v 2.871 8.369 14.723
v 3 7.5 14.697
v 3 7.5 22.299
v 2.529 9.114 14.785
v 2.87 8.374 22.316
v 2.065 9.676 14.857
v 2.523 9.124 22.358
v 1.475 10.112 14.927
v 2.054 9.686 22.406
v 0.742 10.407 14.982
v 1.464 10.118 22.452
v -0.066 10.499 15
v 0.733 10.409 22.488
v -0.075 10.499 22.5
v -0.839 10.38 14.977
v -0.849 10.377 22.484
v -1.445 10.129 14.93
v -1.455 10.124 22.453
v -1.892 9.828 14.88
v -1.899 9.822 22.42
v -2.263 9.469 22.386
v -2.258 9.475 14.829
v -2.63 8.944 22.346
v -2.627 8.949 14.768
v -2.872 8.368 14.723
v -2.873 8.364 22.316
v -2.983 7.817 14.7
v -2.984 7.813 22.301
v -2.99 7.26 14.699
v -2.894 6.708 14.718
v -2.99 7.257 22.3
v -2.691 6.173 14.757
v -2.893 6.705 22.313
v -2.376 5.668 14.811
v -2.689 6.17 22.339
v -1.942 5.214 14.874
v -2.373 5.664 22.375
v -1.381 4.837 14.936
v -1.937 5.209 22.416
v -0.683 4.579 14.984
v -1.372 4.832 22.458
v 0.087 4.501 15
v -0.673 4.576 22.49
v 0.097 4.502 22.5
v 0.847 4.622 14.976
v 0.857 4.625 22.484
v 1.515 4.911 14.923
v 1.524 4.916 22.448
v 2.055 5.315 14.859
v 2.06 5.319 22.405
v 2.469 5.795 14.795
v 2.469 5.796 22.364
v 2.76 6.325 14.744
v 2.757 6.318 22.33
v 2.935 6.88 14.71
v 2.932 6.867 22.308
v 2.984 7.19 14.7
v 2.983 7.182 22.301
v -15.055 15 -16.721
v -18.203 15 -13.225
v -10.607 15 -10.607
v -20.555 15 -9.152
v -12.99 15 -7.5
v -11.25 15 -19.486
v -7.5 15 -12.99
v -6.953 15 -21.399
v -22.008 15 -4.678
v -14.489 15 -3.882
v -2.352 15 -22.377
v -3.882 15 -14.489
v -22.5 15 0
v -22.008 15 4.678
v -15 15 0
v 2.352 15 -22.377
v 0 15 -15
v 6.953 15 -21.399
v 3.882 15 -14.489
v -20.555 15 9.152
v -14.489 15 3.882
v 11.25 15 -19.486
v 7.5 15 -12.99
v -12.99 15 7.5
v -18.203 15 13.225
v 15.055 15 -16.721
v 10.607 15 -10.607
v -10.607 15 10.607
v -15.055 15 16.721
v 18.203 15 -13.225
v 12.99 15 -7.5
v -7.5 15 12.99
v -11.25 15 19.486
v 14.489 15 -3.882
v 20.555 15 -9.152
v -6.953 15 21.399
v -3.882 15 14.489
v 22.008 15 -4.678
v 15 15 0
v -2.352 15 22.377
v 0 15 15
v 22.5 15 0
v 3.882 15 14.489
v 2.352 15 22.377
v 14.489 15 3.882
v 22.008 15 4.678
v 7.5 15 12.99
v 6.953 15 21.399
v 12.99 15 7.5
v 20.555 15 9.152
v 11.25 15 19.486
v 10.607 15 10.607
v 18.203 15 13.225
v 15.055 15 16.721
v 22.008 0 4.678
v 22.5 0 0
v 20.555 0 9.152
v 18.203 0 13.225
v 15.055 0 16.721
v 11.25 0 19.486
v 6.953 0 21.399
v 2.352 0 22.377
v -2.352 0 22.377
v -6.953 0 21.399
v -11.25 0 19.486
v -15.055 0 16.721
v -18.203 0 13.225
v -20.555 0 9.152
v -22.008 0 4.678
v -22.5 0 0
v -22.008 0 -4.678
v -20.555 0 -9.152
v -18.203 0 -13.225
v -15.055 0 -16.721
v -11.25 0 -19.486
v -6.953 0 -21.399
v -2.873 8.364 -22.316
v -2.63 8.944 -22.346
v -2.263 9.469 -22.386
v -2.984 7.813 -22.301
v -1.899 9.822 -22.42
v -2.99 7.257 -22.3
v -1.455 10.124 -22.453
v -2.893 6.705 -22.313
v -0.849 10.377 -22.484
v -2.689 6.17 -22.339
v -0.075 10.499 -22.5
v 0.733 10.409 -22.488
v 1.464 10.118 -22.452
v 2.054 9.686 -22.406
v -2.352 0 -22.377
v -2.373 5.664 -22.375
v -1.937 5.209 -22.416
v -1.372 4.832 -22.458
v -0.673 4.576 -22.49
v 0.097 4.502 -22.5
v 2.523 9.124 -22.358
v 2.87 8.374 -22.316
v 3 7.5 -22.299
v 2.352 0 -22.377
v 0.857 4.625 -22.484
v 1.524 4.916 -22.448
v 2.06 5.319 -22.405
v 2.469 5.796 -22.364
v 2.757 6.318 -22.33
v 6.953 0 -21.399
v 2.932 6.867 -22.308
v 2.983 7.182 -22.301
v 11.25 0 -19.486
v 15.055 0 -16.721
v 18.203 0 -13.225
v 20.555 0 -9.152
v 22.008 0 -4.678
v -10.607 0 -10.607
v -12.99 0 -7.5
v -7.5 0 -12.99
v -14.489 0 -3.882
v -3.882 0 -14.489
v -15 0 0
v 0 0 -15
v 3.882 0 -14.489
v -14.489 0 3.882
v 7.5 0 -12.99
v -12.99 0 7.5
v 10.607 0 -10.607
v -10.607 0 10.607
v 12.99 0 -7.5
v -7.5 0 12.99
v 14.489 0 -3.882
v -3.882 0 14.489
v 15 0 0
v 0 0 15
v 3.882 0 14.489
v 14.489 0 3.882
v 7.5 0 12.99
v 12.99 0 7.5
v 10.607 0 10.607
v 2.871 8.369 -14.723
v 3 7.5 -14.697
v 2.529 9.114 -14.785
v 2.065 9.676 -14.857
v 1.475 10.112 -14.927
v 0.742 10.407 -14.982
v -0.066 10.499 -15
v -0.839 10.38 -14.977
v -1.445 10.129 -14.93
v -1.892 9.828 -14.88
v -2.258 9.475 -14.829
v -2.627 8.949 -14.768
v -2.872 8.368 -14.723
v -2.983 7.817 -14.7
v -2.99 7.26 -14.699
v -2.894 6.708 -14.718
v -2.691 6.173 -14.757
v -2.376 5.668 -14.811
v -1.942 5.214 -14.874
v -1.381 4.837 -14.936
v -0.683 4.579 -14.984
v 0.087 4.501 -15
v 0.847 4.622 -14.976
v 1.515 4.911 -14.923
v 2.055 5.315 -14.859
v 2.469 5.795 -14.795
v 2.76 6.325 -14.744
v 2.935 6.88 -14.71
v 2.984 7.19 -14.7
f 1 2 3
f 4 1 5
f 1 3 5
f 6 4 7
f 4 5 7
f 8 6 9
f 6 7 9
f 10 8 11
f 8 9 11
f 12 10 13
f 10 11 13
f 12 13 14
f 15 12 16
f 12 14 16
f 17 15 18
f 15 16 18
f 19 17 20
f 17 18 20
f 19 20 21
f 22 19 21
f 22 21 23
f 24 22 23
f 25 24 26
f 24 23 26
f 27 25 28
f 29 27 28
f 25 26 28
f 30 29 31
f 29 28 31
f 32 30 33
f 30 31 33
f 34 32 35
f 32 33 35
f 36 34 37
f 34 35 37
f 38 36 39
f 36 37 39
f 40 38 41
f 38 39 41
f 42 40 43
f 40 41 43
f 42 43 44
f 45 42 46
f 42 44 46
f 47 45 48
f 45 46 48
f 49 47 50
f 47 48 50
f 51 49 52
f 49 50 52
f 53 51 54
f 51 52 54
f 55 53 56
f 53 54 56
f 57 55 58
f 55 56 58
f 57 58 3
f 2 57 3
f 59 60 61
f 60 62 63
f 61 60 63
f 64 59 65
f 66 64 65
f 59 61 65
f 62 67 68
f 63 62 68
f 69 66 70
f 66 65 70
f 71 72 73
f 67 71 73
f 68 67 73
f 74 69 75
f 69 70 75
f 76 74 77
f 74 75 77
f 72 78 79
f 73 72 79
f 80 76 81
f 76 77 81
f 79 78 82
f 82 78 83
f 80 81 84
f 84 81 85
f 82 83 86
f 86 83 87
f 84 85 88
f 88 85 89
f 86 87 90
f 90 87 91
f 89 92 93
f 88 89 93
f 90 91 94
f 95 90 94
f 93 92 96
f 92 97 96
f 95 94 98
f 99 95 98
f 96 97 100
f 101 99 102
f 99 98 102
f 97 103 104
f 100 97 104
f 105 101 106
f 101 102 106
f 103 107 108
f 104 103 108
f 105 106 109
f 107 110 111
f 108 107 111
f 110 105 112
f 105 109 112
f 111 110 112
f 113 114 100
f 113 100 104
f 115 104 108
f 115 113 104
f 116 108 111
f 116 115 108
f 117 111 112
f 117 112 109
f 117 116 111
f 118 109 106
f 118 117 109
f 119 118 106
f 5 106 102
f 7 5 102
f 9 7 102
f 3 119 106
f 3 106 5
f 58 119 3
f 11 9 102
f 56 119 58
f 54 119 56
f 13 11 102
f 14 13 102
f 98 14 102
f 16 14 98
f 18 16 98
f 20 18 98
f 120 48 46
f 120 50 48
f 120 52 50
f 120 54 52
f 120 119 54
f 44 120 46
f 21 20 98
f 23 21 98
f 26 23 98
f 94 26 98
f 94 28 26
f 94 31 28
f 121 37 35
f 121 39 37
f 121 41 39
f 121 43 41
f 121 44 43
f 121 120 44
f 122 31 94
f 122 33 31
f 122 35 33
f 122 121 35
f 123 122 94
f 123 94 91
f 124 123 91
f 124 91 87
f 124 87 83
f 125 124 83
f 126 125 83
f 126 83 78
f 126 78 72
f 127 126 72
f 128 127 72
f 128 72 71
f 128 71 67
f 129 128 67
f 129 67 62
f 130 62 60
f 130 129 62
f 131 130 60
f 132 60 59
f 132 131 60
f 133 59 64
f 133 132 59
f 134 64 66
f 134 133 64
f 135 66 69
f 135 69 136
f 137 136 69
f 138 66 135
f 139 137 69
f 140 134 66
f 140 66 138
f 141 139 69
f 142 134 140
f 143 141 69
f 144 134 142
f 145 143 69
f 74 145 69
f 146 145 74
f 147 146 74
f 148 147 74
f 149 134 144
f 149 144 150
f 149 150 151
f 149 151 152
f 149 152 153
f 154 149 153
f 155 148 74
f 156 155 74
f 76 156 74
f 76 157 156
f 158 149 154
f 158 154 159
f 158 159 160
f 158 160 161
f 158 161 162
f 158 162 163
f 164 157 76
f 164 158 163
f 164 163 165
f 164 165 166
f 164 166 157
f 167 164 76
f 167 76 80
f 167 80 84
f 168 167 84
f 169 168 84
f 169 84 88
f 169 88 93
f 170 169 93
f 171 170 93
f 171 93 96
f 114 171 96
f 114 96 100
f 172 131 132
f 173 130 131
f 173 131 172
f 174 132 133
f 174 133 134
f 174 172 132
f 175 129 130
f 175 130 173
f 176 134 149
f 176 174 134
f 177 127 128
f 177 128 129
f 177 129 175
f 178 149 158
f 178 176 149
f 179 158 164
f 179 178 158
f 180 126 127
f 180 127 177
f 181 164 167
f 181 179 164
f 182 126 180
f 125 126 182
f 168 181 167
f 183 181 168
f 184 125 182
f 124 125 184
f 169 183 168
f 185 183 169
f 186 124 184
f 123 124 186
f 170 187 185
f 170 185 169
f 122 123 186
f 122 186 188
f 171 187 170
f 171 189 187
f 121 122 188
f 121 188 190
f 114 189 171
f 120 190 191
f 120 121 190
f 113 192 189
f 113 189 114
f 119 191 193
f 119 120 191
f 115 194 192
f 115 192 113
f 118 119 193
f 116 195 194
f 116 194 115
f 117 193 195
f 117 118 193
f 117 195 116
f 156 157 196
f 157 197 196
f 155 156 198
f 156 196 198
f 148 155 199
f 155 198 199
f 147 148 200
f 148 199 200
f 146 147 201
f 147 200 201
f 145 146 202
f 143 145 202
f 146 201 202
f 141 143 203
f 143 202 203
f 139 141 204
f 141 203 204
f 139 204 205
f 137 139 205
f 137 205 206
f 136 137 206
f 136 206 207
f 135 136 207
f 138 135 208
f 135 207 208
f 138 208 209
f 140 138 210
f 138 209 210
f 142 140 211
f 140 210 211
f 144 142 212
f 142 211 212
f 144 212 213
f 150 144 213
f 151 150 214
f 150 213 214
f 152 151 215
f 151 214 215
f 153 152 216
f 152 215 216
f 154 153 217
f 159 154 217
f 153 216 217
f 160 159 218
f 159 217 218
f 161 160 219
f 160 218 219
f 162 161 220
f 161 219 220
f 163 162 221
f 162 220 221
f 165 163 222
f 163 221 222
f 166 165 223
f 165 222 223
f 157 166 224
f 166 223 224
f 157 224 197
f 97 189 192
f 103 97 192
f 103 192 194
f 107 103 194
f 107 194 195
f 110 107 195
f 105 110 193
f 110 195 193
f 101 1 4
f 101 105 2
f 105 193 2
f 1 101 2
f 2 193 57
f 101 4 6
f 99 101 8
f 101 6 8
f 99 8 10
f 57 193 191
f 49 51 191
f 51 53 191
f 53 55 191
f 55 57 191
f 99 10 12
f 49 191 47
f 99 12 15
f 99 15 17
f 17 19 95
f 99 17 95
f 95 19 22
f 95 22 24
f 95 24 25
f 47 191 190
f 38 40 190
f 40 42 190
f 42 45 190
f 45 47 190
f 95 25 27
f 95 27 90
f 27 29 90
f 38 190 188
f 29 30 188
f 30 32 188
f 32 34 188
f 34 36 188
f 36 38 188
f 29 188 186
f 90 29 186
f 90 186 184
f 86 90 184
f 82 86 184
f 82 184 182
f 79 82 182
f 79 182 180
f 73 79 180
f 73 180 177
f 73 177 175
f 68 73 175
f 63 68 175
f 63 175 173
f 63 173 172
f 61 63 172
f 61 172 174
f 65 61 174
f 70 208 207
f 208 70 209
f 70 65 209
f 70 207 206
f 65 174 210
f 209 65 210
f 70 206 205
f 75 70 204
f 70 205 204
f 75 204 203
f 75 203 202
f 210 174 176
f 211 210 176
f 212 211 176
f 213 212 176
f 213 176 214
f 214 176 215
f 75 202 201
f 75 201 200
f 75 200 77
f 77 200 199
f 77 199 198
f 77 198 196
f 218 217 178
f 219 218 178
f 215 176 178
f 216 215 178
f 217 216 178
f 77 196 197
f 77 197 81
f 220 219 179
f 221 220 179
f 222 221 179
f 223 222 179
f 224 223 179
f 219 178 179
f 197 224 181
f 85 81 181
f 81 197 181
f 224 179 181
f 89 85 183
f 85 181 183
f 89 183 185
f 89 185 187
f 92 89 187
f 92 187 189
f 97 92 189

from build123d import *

# Parameters (mm, degrees)
F0_R     = 15
F0_R_2   = 22.5
F1_DEPTH = 15
F2_DEPTH = 15.001
F3_R     = 3
F4_DEPTH = 25


with BuildPart() as f1:
    # F0 (on Front) → F1 (new body)
    with BuildSketch(Plane.XZ):
        Circle(F0_R)
        Circle(F0_R_2)
        Circle(F0_R, mode=Mode.SUBTRACT)
    extrude(amount=-F1_DEPTH)

    # F0 (on Front) → F2 (cut, through all)
    with BuildSketch(Plane.XZ):
        Circle(F0_R)
    extrude(amount=-F2_DEPTH, mode=Mode.SUBTRACT)

    # F3 (on Top) → F4 (cut, symmetric)
    with BuildSketch(Plane.XY):
        with Locations((0, 7.5)):
            Circle(F3_R)
    extrude(amount=F4_DEPTH, both=True, mode=Mode.SUBTRACT)


solid = f1.part
